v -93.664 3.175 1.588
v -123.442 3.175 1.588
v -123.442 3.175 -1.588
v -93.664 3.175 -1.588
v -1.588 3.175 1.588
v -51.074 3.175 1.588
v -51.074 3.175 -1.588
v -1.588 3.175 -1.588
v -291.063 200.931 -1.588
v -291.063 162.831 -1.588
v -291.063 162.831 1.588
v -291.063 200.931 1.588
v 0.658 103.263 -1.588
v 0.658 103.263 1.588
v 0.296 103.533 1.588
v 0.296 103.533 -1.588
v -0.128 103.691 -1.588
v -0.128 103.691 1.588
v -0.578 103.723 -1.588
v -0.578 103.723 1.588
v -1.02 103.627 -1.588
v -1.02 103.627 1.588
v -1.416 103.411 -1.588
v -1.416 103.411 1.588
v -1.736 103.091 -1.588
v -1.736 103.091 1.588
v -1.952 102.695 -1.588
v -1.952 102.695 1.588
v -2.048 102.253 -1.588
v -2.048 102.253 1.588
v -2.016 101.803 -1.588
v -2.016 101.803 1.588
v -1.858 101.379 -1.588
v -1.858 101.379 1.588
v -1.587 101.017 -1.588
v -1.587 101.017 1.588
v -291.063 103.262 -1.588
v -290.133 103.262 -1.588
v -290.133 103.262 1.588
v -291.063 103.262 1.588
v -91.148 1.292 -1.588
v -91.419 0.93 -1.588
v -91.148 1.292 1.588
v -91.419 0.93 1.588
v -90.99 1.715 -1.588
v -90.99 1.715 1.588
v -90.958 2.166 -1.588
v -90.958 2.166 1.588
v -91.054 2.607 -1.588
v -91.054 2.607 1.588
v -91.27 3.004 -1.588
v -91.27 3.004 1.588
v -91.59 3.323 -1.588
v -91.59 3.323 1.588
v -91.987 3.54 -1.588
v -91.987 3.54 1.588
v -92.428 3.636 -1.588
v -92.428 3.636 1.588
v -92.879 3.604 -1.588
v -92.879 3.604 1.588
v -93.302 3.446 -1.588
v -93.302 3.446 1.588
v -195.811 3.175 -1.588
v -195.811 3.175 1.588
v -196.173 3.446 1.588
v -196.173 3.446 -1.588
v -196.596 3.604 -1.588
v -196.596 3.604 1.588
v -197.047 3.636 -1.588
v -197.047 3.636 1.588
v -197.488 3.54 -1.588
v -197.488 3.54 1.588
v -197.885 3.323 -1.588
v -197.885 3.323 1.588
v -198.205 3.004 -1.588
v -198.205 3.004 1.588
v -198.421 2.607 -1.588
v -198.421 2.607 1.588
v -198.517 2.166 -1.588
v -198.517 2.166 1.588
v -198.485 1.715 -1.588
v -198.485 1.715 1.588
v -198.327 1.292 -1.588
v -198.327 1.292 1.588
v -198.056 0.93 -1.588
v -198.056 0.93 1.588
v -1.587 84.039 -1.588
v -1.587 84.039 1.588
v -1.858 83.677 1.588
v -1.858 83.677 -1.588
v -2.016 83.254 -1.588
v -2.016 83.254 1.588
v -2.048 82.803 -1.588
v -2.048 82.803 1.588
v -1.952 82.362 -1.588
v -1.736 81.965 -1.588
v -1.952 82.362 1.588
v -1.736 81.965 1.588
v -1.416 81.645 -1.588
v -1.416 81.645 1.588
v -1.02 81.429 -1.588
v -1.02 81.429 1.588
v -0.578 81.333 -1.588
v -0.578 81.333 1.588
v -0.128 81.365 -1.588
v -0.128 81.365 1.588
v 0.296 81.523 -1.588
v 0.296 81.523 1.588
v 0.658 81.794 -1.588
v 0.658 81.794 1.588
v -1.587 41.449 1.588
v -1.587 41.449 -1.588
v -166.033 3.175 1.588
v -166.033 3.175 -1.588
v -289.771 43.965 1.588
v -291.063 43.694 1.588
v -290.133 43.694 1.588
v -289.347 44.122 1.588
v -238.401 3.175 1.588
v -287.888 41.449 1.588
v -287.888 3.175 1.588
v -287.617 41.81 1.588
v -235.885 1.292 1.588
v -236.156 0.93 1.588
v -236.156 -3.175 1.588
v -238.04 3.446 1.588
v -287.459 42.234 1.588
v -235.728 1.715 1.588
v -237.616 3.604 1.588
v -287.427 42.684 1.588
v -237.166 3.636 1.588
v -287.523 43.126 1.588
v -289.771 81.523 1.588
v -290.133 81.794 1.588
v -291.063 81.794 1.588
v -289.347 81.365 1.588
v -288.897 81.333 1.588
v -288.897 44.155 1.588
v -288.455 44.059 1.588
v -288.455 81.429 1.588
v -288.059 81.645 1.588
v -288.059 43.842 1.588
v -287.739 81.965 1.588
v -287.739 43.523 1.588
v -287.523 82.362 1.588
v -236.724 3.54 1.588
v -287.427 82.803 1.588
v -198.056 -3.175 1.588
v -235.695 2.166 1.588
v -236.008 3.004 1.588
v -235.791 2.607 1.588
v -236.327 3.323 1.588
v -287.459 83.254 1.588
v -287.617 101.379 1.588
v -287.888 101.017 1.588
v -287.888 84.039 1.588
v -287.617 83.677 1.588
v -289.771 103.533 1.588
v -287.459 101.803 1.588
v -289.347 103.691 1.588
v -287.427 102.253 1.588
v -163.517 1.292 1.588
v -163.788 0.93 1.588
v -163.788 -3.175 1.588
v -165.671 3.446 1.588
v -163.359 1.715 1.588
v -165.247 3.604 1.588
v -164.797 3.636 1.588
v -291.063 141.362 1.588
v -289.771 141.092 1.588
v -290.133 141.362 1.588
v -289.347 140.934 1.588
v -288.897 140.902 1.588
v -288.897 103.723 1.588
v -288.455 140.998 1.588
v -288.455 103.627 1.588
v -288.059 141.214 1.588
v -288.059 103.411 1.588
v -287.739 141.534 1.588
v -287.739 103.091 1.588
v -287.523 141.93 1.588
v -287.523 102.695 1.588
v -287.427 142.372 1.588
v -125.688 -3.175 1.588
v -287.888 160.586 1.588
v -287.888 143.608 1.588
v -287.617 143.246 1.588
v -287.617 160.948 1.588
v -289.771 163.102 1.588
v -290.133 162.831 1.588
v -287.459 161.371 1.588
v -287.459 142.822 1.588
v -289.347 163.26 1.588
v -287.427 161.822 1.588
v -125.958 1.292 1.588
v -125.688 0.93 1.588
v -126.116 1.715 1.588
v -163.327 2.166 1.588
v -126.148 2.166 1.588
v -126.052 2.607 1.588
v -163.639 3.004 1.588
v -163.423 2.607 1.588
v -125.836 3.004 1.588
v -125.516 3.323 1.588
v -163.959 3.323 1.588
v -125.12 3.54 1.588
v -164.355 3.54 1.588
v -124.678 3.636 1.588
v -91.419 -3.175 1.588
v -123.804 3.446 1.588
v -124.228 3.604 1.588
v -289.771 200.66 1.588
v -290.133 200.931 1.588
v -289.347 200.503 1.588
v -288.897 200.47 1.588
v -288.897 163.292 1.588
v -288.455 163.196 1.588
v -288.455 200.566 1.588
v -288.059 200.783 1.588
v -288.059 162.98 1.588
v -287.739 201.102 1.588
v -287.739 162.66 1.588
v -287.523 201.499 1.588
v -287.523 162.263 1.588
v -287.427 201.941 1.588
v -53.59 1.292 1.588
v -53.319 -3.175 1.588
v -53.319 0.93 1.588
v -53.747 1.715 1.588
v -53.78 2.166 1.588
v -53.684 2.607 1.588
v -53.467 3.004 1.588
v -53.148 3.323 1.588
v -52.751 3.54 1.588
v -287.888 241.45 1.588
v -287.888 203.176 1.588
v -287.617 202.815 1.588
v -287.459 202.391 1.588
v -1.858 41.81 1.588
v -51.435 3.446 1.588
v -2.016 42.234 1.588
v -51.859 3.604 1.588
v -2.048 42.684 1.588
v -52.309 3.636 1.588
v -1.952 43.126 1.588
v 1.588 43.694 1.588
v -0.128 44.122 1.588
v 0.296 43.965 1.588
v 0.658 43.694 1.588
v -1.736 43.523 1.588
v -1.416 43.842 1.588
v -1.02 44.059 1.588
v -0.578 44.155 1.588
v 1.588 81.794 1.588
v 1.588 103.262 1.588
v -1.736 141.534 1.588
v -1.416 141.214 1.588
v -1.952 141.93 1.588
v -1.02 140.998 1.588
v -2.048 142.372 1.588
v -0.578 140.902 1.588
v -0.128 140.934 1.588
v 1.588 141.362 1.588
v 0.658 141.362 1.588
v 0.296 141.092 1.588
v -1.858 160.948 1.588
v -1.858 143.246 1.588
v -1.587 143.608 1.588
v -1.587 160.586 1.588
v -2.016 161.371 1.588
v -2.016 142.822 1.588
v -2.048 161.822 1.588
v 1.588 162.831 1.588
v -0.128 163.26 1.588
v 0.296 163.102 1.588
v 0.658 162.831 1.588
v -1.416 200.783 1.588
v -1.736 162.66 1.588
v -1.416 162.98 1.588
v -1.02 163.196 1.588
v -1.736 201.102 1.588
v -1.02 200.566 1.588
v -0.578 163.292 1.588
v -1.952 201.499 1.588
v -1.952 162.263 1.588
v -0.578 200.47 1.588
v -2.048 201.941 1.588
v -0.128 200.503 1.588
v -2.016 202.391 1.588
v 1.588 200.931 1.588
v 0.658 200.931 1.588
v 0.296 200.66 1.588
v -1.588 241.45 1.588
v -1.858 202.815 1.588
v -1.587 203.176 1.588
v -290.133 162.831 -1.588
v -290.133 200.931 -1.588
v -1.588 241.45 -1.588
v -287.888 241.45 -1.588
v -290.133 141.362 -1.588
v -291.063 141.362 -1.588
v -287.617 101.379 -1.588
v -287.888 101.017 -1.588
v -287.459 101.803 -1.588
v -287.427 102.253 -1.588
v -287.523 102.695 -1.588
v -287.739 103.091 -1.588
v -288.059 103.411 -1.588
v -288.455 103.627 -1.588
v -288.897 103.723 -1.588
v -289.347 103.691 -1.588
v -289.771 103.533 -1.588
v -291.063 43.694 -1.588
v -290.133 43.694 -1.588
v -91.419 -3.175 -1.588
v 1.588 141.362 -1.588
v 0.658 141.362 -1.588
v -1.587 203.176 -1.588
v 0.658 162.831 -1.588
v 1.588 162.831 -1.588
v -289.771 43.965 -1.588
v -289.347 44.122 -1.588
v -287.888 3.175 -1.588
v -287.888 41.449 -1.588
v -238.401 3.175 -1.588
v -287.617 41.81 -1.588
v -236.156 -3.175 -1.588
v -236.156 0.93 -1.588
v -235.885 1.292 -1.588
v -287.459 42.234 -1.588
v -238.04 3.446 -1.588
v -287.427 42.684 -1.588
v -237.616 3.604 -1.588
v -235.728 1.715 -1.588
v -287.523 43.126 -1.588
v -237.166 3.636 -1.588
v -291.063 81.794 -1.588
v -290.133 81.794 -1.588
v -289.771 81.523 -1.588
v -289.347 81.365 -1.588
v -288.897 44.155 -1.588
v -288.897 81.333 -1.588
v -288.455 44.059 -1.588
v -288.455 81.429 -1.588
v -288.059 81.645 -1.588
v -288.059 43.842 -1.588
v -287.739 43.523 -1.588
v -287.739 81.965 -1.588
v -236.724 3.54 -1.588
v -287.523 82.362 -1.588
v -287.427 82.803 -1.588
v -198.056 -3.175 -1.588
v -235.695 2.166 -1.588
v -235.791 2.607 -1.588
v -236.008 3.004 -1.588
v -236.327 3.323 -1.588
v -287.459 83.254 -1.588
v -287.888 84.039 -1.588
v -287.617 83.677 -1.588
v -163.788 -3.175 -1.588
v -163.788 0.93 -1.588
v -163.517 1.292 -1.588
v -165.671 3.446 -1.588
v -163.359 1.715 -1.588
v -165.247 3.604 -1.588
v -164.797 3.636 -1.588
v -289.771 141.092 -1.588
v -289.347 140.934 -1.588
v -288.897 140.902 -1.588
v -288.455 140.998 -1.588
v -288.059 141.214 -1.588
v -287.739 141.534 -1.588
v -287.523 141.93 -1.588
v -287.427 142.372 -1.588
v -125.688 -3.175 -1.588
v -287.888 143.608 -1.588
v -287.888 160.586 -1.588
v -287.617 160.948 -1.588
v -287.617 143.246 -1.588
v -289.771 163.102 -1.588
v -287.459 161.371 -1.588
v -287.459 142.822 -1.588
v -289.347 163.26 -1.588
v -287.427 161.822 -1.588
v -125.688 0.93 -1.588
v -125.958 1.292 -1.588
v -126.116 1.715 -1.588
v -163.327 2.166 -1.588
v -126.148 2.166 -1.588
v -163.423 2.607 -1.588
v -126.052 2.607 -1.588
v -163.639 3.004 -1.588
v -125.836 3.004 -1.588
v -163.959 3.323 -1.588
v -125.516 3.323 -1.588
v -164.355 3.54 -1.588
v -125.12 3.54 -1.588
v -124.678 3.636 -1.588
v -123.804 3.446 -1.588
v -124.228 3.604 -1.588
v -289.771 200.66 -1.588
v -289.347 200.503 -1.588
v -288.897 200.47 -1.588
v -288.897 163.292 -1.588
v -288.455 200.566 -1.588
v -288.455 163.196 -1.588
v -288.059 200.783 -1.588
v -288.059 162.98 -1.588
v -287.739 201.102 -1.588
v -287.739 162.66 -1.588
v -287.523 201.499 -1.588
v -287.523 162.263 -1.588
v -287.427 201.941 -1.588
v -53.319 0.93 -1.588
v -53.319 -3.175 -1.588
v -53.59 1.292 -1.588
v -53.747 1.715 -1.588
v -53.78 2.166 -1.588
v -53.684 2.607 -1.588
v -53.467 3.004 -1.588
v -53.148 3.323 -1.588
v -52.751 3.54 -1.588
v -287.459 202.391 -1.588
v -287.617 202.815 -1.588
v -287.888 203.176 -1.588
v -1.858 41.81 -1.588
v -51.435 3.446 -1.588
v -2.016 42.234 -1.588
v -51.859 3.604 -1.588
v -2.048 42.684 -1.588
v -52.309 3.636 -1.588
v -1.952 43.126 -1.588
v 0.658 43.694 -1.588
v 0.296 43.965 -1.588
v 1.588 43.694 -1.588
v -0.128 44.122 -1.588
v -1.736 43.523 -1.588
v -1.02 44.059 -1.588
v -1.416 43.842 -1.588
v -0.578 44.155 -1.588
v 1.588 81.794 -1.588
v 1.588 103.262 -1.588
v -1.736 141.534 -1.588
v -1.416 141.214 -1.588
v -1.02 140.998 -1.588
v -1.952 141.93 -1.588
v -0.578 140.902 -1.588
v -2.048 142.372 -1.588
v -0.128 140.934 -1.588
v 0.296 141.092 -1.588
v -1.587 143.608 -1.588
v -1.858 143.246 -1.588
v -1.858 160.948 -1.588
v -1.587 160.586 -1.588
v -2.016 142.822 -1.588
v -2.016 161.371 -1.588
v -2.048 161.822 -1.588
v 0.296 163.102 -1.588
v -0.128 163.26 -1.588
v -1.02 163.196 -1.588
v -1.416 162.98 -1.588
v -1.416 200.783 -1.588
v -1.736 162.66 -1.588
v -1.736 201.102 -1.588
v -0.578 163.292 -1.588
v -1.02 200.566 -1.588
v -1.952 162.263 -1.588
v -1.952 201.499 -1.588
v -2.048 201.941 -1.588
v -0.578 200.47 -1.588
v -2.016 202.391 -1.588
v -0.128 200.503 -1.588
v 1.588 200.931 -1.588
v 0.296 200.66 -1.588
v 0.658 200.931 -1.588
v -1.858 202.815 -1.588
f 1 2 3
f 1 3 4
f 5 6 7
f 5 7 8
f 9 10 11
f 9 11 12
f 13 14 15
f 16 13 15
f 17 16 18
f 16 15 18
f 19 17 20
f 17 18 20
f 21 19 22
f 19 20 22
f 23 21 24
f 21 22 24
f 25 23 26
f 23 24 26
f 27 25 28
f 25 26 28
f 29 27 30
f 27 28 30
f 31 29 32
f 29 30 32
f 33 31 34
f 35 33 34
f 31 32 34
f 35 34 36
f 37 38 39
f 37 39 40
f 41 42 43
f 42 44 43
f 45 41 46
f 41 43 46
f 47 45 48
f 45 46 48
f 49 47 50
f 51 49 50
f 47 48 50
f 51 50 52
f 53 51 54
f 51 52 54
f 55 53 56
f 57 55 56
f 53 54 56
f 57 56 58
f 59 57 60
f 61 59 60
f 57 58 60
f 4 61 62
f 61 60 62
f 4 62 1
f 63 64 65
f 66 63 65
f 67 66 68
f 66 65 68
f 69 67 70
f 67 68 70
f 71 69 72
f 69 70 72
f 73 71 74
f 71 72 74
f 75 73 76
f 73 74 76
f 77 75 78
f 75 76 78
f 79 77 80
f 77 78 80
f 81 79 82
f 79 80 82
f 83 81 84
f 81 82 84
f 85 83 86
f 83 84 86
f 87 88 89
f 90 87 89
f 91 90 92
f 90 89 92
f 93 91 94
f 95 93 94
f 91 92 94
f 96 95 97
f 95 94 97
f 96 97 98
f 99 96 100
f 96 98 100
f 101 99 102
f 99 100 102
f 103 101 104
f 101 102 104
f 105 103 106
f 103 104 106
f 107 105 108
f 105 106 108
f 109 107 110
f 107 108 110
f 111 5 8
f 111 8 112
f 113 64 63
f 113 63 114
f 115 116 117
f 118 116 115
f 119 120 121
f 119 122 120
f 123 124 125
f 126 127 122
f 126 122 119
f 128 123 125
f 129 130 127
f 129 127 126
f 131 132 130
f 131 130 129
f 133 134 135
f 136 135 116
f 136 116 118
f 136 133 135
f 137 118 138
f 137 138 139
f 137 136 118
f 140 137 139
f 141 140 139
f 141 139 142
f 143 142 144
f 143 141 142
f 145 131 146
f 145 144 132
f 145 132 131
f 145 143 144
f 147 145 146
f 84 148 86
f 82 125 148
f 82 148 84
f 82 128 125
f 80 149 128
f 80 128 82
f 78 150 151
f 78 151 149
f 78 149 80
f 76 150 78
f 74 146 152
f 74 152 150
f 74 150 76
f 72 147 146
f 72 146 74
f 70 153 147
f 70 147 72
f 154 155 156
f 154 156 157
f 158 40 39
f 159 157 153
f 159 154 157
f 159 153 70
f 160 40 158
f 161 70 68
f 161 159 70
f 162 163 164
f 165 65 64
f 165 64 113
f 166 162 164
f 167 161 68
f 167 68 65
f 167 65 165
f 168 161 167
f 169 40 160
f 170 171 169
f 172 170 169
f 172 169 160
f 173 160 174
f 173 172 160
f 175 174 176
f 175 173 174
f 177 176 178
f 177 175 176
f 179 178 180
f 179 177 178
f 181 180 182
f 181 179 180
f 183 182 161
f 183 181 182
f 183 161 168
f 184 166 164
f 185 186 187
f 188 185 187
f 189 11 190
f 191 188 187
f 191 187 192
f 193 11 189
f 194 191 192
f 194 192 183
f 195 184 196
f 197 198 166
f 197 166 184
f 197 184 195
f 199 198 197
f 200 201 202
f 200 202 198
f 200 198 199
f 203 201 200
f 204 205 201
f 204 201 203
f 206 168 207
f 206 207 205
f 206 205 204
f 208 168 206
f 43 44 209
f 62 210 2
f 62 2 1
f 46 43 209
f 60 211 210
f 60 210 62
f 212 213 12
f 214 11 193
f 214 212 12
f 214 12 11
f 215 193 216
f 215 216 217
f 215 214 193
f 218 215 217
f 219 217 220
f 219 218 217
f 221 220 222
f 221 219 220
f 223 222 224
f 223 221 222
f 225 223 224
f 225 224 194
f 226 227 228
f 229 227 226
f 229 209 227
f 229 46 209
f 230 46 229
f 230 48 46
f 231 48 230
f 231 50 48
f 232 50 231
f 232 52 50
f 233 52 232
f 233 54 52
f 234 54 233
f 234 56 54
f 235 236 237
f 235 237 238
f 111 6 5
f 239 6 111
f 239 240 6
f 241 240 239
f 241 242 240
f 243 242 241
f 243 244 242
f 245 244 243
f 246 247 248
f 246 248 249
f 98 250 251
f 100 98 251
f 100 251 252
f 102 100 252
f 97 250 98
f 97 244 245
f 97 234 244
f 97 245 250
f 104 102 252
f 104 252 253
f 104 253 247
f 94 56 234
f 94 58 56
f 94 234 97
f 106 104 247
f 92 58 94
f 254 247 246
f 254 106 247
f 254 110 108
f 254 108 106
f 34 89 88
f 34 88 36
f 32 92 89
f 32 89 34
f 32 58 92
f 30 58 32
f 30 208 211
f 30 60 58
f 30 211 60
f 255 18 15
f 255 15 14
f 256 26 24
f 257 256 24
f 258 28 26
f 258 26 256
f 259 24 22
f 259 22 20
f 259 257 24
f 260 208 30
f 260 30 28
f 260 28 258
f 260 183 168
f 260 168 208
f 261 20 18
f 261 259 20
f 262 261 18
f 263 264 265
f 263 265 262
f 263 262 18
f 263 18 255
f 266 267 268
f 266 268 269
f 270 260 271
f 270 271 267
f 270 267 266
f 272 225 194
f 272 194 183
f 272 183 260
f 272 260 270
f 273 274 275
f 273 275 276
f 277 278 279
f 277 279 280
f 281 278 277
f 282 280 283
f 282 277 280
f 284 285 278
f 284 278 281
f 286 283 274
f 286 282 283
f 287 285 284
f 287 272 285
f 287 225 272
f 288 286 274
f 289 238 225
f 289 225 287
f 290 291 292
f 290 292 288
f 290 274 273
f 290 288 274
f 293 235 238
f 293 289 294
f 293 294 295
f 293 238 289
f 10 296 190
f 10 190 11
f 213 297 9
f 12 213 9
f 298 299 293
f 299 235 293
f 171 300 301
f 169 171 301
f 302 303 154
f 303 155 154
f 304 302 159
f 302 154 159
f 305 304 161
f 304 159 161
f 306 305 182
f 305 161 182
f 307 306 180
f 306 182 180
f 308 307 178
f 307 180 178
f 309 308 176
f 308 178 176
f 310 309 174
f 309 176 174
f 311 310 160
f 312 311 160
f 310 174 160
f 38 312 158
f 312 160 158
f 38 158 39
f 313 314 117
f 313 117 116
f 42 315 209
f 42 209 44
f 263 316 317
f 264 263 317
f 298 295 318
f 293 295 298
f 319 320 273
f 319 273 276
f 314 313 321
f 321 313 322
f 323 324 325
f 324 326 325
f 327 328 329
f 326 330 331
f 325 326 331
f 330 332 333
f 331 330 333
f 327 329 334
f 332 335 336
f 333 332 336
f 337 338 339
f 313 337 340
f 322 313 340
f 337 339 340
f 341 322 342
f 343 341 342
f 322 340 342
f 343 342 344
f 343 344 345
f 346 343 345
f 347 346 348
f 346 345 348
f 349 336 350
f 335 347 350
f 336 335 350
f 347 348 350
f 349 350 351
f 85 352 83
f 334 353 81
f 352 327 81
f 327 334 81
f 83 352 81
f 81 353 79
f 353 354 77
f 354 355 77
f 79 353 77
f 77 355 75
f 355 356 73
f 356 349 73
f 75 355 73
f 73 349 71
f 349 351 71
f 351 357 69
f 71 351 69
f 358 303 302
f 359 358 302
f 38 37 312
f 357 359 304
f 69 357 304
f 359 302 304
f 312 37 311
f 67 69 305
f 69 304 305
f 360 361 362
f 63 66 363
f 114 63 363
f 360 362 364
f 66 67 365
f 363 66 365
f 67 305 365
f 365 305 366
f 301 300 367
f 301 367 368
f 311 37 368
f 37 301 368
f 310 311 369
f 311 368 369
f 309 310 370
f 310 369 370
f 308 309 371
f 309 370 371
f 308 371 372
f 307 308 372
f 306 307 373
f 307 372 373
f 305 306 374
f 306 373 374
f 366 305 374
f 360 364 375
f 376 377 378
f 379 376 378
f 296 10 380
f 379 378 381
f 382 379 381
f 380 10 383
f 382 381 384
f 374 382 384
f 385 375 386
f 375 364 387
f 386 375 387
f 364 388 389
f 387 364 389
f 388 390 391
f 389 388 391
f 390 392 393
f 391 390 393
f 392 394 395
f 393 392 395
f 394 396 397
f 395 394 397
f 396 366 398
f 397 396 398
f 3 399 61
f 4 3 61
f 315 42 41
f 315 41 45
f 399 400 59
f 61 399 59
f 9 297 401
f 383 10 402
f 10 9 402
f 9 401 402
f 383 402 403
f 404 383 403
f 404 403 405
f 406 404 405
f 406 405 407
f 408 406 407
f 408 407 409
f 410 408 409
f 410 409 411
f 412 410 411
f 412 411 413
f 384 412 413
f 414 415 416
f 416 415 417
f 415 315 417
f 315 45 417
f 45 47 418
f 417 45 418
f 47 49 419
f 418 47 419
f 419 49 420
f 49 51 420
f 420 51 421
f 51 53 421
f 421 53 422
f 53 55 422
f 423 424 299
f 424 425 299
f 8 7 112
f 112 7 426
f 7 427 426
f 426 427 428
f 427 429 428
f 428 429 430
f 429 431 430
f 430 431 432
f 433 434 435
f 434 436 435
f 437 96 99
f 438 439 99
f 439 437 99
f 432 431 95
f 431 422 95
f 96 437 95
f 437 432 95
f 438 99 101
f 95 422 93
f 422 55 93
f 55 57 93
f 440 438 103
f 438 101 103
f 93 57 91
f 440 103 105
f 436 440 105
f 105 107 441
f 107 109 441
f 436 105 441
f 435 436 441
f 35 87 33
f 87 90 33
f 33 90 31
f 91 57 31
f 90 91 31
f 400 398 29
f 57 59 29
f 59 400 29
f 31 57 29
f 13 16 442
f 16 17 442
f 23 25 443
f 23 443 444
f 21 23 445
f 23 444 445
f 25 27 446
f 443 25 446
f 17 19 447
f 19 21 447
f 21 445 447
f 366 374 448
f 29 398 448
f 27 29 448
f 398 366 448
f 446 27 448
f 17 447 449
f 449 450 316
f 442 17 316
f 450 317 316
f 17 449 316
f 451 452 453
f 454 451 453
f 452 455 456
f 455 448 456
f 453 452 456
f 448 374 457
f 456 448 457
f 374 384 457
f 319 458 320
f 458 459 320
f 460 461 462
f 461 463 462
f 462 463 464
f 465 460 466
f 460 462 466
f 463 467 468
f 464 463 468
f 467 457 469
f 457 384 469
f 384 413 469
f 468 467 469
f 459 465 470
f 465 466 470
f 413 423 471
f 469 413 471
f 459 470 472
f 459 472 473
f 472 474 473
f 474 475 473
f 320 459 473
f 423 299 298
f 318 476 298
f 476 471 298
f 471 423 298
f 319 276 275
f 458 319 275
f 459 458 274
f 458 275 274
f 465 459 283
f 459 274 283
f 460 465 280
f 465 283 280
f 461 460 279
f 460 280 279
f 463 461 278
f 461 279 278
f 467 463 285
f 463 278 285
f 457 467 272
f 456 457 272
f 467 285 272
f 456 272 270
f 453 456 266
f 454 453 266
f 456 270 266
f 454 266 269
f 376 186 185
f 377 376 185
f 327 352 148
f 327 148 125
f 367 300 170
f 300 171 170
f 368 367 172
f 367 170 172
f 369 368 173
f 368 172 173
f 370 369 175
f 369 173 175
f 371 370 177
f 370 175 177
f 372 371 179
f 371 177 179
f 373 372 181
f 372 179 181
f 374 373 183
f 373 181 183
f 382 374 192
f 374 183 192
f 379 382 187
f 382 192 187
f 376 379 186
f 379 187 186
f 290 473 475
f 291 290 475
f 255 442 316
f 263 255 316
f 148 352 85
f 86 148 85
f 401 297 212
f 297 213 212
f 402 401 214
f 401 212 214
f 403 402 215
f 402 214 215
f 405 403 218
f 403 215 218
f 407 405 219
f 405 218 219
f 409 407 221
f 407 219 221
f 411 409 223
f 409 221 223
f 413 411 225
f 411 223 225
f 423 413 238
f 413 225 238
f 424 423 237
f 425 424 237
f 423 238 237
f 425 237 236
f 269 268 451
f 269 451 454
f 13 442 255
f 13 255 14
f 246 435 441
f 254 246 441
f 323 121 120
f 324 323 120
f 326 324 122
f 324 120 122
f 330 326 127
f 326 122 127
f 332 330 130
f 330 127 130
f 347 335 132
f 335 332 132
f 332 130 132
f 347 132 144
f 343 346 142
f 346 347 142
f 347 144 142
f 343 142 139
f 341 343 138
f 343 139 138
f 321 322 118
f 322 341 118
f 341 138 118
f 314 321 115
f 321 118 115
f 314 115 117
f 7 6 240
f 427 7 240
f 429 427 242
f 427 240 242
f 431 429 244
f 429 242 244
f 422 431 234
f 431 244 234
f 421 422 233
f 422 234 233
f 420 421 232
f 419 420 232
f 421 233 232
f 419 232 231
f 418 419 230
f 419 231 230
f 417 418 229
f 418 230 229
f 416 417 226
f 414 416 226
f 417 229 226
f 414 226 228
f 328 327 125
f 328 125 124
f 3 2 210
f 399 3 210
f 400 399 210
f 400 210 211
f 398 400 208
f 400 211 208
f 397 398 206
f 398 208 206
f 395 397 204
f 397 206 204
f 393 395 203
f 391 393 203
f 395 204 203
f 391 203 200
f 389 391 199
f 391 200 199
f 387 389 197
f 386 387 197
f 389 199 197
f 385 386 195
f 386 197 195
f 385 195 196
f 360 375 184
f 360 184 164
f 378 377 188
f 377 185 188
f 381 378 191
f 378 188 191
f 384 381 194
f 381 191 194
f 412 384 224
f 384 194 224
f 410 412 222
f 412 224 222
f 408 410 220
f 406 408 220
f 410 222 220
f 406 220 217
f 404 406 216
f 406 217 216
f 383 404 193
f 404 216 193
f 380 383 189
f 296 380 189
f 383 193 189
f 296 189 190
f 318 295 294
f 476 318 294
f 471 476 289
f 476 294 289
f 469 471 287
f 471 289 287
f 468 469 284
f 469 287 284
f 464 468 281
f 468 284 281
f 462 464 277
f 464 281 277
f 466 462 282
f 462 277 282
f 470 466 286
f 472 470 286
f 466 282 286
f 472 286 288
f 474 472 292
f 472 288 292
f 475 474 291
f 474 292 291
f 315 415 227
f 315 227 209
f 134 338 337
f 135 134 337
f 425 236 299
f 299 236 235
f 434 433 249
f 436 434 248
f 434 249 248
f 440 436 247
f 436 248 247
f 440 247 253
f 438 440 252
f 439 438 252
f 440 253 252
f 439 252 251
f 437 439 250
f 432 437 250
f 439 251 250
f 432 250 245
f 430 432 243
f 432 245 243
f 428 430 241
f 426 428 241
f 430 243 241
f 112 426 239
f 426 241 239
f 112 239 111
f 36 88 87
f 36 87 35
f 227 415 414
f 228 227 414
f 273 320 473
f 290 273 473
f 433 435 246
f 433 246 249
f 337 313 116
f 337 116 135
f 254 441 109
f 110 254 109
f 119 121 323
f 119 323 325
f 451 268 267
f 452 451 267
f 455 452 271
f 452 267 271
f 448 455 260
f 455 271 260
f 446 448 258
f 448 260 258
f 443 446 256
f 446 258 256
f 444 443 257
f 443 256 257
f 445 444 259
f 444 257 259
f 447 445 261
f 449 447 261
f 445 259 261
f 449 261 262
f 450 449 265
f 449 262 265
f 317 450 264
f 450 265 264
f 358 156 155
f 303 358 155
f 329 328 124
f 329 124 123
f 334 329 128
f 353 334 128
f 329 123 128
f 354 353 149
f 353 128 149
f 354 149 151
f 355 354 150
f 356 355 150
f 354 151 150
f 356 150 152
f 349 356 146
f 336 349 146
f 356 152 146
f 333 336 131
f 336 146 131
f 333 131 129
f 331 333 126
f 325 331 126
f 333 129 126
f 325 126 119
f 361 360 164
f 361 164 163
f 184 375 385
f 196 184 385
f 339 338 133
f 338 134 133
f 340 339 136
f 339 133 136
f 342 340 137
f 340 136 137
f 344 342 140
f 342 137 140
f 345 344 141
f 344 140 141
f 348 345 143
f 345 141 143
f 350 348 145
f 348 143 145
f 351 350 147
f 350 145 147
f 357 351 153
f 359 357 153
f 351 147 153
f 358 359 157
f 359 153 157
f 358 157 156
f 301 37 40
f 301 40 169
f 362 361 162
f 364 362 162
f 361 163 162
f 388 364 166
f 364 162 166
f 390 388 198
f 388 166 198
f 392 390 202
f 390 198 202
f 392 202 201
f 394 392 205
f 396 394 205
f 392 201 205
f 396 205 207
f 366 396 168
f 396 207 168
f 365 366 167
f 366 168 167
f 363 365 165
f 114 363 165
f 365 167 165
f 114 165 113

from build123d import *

# Parameters (mm, degrees)
SKETCH2_W               = 286.300000032
SKETCH2_H               = 238.275
BOSS_EXTRUDE1_DEPTH     = 1.5875
SKETCH4_W               = 3.175
SKETCH4_H               = 38.1
SKETCH4_W_2             = 38.1
SKETCH4_H_2             = 6.35
WELD_TABS_EXTRUDE_DEPTH = 3.175
SKETCH5_R               = 1.5875
CUT_EXTRUDE1_DEPTH      = 3.175


with BuildPart() as part:
    # Sketch2 → Boss-Extrude1 (new body, symmetric)
    with BuildSketch(Plane.XY):
        with Locations((-144.737500016, 122.3125)):
            Rectangle(SKETCH2_W, SKETCH2_H)
    extrude(amount=BOSS_EXTRUDE1_DEPTH, both=True)

    # Sketch4 → Weld Tabs Extrude (add)
    with BuildSketch(Plane(origin=(0, 0, -1.5875), x_dir=(-1, 0, 0), z_dir=(0, 0, -1))):
        with Locations((0, 181.88125)):
            Rectangle(SKETCH4_W, SKETCH4_H)
        with Locations((0, 122.3125)):
            Rectangle(SKETCH4_W, SKETCH4_H)
        with Locations((0, 62.74375)):
            Rectangle(SKETCH4_W, SKETCH4_H)
        with Locations((72.368750008, 0)):
            Rectangle(SKETCH4_W_2, SKETCH4_H_2)
        with Locations((144.737500016, 0)):
            Rectangle(SKETCH4_W_2, SKETCH4_H_2)
        with Locations((217.106250024, 0)):
            Rectangle(SKETCH4_W_2, SKETCH4_H_2)
        with Locations((289.475000032, 181.88125)):
            Rectangle(SKETCH4_W, SKETCH4_H)
        with Locations((289.475000032, 122.3125)):
            Rectangle(SKETCH4_W, SKETCH4_H)
        with Locations((289.475000032, 62.74375)):
            Rectangle(SKETCH4_W, SKETCH4_H)
    extrude(amount=-WELD_TABS_EXTRUDE_DEPTH)

    # Sketch5 → Cut-Extrude1 (cut)
    with BuildSketch(Plane.XY.offset(1.5875)):
        with Locations((-0.464967985, 202.053782015)):
            Circle(SKETCH5_R)
        with Locations((-0.464967985, 142.485032015)):
            Circle(SKETCH5_R)
        with Locations((-0.464967985, 82.916282015)):
            Circle(SKETCH5_R)
        with Locations((-0.464967985, 161.708717985)):
            Circle(SKETCH5_R)
        with Locations((-0.464967985, 102.139967985)):
            Circle(SKETCH5_R)
        with Locations((-0.464967985, 42.571217985)):
            Circle(SKETCH5_R)
        with Locations((-289.010032047, 42.571217985)):
            Circle(SKETCH5_R)
        with Locations((-289.010032047, 82.916282015)):
            Circle(SKETCH5_R)
        with Locations((-289.010032047, 102.139967985)):
            Circle(SKETCH5_R)
        with Locations((-289.010032047, 142.485032015)):
            Circle(SKETCH5_R)
        with Locations((-289.010032047, 161.708717985)):
            Circle(SKETCH5_R)
        with Locations((-289.010032047, 202.053782015)):
            Circle(SKETCH5_R)
        with Locations((-52.196217993, 2.052467985)):
            Circle(SKETCH5_R)
        with Locations((-92.541282023, 2.052467985)):
            Circle(SKETCH5_R)
        with Locations((-124.564968001, 2.052467985)):
            Circle(SKETCH5_R)
        with Locations((-237.278782039, 2.052467985)):
            Circle(SKETCH5_R)
        with Locations((-196.933718009, 2.052467985)):
            Circle(SKETCH5_R)
        with Locations((-164.910032031, 2.052467985)):
            Circle(SKETCH5_R)
    extrude(amount=-CUT_EXTRUDE1_DEPTH, mode=Mode.SUBTRACT)


solid = part.part
